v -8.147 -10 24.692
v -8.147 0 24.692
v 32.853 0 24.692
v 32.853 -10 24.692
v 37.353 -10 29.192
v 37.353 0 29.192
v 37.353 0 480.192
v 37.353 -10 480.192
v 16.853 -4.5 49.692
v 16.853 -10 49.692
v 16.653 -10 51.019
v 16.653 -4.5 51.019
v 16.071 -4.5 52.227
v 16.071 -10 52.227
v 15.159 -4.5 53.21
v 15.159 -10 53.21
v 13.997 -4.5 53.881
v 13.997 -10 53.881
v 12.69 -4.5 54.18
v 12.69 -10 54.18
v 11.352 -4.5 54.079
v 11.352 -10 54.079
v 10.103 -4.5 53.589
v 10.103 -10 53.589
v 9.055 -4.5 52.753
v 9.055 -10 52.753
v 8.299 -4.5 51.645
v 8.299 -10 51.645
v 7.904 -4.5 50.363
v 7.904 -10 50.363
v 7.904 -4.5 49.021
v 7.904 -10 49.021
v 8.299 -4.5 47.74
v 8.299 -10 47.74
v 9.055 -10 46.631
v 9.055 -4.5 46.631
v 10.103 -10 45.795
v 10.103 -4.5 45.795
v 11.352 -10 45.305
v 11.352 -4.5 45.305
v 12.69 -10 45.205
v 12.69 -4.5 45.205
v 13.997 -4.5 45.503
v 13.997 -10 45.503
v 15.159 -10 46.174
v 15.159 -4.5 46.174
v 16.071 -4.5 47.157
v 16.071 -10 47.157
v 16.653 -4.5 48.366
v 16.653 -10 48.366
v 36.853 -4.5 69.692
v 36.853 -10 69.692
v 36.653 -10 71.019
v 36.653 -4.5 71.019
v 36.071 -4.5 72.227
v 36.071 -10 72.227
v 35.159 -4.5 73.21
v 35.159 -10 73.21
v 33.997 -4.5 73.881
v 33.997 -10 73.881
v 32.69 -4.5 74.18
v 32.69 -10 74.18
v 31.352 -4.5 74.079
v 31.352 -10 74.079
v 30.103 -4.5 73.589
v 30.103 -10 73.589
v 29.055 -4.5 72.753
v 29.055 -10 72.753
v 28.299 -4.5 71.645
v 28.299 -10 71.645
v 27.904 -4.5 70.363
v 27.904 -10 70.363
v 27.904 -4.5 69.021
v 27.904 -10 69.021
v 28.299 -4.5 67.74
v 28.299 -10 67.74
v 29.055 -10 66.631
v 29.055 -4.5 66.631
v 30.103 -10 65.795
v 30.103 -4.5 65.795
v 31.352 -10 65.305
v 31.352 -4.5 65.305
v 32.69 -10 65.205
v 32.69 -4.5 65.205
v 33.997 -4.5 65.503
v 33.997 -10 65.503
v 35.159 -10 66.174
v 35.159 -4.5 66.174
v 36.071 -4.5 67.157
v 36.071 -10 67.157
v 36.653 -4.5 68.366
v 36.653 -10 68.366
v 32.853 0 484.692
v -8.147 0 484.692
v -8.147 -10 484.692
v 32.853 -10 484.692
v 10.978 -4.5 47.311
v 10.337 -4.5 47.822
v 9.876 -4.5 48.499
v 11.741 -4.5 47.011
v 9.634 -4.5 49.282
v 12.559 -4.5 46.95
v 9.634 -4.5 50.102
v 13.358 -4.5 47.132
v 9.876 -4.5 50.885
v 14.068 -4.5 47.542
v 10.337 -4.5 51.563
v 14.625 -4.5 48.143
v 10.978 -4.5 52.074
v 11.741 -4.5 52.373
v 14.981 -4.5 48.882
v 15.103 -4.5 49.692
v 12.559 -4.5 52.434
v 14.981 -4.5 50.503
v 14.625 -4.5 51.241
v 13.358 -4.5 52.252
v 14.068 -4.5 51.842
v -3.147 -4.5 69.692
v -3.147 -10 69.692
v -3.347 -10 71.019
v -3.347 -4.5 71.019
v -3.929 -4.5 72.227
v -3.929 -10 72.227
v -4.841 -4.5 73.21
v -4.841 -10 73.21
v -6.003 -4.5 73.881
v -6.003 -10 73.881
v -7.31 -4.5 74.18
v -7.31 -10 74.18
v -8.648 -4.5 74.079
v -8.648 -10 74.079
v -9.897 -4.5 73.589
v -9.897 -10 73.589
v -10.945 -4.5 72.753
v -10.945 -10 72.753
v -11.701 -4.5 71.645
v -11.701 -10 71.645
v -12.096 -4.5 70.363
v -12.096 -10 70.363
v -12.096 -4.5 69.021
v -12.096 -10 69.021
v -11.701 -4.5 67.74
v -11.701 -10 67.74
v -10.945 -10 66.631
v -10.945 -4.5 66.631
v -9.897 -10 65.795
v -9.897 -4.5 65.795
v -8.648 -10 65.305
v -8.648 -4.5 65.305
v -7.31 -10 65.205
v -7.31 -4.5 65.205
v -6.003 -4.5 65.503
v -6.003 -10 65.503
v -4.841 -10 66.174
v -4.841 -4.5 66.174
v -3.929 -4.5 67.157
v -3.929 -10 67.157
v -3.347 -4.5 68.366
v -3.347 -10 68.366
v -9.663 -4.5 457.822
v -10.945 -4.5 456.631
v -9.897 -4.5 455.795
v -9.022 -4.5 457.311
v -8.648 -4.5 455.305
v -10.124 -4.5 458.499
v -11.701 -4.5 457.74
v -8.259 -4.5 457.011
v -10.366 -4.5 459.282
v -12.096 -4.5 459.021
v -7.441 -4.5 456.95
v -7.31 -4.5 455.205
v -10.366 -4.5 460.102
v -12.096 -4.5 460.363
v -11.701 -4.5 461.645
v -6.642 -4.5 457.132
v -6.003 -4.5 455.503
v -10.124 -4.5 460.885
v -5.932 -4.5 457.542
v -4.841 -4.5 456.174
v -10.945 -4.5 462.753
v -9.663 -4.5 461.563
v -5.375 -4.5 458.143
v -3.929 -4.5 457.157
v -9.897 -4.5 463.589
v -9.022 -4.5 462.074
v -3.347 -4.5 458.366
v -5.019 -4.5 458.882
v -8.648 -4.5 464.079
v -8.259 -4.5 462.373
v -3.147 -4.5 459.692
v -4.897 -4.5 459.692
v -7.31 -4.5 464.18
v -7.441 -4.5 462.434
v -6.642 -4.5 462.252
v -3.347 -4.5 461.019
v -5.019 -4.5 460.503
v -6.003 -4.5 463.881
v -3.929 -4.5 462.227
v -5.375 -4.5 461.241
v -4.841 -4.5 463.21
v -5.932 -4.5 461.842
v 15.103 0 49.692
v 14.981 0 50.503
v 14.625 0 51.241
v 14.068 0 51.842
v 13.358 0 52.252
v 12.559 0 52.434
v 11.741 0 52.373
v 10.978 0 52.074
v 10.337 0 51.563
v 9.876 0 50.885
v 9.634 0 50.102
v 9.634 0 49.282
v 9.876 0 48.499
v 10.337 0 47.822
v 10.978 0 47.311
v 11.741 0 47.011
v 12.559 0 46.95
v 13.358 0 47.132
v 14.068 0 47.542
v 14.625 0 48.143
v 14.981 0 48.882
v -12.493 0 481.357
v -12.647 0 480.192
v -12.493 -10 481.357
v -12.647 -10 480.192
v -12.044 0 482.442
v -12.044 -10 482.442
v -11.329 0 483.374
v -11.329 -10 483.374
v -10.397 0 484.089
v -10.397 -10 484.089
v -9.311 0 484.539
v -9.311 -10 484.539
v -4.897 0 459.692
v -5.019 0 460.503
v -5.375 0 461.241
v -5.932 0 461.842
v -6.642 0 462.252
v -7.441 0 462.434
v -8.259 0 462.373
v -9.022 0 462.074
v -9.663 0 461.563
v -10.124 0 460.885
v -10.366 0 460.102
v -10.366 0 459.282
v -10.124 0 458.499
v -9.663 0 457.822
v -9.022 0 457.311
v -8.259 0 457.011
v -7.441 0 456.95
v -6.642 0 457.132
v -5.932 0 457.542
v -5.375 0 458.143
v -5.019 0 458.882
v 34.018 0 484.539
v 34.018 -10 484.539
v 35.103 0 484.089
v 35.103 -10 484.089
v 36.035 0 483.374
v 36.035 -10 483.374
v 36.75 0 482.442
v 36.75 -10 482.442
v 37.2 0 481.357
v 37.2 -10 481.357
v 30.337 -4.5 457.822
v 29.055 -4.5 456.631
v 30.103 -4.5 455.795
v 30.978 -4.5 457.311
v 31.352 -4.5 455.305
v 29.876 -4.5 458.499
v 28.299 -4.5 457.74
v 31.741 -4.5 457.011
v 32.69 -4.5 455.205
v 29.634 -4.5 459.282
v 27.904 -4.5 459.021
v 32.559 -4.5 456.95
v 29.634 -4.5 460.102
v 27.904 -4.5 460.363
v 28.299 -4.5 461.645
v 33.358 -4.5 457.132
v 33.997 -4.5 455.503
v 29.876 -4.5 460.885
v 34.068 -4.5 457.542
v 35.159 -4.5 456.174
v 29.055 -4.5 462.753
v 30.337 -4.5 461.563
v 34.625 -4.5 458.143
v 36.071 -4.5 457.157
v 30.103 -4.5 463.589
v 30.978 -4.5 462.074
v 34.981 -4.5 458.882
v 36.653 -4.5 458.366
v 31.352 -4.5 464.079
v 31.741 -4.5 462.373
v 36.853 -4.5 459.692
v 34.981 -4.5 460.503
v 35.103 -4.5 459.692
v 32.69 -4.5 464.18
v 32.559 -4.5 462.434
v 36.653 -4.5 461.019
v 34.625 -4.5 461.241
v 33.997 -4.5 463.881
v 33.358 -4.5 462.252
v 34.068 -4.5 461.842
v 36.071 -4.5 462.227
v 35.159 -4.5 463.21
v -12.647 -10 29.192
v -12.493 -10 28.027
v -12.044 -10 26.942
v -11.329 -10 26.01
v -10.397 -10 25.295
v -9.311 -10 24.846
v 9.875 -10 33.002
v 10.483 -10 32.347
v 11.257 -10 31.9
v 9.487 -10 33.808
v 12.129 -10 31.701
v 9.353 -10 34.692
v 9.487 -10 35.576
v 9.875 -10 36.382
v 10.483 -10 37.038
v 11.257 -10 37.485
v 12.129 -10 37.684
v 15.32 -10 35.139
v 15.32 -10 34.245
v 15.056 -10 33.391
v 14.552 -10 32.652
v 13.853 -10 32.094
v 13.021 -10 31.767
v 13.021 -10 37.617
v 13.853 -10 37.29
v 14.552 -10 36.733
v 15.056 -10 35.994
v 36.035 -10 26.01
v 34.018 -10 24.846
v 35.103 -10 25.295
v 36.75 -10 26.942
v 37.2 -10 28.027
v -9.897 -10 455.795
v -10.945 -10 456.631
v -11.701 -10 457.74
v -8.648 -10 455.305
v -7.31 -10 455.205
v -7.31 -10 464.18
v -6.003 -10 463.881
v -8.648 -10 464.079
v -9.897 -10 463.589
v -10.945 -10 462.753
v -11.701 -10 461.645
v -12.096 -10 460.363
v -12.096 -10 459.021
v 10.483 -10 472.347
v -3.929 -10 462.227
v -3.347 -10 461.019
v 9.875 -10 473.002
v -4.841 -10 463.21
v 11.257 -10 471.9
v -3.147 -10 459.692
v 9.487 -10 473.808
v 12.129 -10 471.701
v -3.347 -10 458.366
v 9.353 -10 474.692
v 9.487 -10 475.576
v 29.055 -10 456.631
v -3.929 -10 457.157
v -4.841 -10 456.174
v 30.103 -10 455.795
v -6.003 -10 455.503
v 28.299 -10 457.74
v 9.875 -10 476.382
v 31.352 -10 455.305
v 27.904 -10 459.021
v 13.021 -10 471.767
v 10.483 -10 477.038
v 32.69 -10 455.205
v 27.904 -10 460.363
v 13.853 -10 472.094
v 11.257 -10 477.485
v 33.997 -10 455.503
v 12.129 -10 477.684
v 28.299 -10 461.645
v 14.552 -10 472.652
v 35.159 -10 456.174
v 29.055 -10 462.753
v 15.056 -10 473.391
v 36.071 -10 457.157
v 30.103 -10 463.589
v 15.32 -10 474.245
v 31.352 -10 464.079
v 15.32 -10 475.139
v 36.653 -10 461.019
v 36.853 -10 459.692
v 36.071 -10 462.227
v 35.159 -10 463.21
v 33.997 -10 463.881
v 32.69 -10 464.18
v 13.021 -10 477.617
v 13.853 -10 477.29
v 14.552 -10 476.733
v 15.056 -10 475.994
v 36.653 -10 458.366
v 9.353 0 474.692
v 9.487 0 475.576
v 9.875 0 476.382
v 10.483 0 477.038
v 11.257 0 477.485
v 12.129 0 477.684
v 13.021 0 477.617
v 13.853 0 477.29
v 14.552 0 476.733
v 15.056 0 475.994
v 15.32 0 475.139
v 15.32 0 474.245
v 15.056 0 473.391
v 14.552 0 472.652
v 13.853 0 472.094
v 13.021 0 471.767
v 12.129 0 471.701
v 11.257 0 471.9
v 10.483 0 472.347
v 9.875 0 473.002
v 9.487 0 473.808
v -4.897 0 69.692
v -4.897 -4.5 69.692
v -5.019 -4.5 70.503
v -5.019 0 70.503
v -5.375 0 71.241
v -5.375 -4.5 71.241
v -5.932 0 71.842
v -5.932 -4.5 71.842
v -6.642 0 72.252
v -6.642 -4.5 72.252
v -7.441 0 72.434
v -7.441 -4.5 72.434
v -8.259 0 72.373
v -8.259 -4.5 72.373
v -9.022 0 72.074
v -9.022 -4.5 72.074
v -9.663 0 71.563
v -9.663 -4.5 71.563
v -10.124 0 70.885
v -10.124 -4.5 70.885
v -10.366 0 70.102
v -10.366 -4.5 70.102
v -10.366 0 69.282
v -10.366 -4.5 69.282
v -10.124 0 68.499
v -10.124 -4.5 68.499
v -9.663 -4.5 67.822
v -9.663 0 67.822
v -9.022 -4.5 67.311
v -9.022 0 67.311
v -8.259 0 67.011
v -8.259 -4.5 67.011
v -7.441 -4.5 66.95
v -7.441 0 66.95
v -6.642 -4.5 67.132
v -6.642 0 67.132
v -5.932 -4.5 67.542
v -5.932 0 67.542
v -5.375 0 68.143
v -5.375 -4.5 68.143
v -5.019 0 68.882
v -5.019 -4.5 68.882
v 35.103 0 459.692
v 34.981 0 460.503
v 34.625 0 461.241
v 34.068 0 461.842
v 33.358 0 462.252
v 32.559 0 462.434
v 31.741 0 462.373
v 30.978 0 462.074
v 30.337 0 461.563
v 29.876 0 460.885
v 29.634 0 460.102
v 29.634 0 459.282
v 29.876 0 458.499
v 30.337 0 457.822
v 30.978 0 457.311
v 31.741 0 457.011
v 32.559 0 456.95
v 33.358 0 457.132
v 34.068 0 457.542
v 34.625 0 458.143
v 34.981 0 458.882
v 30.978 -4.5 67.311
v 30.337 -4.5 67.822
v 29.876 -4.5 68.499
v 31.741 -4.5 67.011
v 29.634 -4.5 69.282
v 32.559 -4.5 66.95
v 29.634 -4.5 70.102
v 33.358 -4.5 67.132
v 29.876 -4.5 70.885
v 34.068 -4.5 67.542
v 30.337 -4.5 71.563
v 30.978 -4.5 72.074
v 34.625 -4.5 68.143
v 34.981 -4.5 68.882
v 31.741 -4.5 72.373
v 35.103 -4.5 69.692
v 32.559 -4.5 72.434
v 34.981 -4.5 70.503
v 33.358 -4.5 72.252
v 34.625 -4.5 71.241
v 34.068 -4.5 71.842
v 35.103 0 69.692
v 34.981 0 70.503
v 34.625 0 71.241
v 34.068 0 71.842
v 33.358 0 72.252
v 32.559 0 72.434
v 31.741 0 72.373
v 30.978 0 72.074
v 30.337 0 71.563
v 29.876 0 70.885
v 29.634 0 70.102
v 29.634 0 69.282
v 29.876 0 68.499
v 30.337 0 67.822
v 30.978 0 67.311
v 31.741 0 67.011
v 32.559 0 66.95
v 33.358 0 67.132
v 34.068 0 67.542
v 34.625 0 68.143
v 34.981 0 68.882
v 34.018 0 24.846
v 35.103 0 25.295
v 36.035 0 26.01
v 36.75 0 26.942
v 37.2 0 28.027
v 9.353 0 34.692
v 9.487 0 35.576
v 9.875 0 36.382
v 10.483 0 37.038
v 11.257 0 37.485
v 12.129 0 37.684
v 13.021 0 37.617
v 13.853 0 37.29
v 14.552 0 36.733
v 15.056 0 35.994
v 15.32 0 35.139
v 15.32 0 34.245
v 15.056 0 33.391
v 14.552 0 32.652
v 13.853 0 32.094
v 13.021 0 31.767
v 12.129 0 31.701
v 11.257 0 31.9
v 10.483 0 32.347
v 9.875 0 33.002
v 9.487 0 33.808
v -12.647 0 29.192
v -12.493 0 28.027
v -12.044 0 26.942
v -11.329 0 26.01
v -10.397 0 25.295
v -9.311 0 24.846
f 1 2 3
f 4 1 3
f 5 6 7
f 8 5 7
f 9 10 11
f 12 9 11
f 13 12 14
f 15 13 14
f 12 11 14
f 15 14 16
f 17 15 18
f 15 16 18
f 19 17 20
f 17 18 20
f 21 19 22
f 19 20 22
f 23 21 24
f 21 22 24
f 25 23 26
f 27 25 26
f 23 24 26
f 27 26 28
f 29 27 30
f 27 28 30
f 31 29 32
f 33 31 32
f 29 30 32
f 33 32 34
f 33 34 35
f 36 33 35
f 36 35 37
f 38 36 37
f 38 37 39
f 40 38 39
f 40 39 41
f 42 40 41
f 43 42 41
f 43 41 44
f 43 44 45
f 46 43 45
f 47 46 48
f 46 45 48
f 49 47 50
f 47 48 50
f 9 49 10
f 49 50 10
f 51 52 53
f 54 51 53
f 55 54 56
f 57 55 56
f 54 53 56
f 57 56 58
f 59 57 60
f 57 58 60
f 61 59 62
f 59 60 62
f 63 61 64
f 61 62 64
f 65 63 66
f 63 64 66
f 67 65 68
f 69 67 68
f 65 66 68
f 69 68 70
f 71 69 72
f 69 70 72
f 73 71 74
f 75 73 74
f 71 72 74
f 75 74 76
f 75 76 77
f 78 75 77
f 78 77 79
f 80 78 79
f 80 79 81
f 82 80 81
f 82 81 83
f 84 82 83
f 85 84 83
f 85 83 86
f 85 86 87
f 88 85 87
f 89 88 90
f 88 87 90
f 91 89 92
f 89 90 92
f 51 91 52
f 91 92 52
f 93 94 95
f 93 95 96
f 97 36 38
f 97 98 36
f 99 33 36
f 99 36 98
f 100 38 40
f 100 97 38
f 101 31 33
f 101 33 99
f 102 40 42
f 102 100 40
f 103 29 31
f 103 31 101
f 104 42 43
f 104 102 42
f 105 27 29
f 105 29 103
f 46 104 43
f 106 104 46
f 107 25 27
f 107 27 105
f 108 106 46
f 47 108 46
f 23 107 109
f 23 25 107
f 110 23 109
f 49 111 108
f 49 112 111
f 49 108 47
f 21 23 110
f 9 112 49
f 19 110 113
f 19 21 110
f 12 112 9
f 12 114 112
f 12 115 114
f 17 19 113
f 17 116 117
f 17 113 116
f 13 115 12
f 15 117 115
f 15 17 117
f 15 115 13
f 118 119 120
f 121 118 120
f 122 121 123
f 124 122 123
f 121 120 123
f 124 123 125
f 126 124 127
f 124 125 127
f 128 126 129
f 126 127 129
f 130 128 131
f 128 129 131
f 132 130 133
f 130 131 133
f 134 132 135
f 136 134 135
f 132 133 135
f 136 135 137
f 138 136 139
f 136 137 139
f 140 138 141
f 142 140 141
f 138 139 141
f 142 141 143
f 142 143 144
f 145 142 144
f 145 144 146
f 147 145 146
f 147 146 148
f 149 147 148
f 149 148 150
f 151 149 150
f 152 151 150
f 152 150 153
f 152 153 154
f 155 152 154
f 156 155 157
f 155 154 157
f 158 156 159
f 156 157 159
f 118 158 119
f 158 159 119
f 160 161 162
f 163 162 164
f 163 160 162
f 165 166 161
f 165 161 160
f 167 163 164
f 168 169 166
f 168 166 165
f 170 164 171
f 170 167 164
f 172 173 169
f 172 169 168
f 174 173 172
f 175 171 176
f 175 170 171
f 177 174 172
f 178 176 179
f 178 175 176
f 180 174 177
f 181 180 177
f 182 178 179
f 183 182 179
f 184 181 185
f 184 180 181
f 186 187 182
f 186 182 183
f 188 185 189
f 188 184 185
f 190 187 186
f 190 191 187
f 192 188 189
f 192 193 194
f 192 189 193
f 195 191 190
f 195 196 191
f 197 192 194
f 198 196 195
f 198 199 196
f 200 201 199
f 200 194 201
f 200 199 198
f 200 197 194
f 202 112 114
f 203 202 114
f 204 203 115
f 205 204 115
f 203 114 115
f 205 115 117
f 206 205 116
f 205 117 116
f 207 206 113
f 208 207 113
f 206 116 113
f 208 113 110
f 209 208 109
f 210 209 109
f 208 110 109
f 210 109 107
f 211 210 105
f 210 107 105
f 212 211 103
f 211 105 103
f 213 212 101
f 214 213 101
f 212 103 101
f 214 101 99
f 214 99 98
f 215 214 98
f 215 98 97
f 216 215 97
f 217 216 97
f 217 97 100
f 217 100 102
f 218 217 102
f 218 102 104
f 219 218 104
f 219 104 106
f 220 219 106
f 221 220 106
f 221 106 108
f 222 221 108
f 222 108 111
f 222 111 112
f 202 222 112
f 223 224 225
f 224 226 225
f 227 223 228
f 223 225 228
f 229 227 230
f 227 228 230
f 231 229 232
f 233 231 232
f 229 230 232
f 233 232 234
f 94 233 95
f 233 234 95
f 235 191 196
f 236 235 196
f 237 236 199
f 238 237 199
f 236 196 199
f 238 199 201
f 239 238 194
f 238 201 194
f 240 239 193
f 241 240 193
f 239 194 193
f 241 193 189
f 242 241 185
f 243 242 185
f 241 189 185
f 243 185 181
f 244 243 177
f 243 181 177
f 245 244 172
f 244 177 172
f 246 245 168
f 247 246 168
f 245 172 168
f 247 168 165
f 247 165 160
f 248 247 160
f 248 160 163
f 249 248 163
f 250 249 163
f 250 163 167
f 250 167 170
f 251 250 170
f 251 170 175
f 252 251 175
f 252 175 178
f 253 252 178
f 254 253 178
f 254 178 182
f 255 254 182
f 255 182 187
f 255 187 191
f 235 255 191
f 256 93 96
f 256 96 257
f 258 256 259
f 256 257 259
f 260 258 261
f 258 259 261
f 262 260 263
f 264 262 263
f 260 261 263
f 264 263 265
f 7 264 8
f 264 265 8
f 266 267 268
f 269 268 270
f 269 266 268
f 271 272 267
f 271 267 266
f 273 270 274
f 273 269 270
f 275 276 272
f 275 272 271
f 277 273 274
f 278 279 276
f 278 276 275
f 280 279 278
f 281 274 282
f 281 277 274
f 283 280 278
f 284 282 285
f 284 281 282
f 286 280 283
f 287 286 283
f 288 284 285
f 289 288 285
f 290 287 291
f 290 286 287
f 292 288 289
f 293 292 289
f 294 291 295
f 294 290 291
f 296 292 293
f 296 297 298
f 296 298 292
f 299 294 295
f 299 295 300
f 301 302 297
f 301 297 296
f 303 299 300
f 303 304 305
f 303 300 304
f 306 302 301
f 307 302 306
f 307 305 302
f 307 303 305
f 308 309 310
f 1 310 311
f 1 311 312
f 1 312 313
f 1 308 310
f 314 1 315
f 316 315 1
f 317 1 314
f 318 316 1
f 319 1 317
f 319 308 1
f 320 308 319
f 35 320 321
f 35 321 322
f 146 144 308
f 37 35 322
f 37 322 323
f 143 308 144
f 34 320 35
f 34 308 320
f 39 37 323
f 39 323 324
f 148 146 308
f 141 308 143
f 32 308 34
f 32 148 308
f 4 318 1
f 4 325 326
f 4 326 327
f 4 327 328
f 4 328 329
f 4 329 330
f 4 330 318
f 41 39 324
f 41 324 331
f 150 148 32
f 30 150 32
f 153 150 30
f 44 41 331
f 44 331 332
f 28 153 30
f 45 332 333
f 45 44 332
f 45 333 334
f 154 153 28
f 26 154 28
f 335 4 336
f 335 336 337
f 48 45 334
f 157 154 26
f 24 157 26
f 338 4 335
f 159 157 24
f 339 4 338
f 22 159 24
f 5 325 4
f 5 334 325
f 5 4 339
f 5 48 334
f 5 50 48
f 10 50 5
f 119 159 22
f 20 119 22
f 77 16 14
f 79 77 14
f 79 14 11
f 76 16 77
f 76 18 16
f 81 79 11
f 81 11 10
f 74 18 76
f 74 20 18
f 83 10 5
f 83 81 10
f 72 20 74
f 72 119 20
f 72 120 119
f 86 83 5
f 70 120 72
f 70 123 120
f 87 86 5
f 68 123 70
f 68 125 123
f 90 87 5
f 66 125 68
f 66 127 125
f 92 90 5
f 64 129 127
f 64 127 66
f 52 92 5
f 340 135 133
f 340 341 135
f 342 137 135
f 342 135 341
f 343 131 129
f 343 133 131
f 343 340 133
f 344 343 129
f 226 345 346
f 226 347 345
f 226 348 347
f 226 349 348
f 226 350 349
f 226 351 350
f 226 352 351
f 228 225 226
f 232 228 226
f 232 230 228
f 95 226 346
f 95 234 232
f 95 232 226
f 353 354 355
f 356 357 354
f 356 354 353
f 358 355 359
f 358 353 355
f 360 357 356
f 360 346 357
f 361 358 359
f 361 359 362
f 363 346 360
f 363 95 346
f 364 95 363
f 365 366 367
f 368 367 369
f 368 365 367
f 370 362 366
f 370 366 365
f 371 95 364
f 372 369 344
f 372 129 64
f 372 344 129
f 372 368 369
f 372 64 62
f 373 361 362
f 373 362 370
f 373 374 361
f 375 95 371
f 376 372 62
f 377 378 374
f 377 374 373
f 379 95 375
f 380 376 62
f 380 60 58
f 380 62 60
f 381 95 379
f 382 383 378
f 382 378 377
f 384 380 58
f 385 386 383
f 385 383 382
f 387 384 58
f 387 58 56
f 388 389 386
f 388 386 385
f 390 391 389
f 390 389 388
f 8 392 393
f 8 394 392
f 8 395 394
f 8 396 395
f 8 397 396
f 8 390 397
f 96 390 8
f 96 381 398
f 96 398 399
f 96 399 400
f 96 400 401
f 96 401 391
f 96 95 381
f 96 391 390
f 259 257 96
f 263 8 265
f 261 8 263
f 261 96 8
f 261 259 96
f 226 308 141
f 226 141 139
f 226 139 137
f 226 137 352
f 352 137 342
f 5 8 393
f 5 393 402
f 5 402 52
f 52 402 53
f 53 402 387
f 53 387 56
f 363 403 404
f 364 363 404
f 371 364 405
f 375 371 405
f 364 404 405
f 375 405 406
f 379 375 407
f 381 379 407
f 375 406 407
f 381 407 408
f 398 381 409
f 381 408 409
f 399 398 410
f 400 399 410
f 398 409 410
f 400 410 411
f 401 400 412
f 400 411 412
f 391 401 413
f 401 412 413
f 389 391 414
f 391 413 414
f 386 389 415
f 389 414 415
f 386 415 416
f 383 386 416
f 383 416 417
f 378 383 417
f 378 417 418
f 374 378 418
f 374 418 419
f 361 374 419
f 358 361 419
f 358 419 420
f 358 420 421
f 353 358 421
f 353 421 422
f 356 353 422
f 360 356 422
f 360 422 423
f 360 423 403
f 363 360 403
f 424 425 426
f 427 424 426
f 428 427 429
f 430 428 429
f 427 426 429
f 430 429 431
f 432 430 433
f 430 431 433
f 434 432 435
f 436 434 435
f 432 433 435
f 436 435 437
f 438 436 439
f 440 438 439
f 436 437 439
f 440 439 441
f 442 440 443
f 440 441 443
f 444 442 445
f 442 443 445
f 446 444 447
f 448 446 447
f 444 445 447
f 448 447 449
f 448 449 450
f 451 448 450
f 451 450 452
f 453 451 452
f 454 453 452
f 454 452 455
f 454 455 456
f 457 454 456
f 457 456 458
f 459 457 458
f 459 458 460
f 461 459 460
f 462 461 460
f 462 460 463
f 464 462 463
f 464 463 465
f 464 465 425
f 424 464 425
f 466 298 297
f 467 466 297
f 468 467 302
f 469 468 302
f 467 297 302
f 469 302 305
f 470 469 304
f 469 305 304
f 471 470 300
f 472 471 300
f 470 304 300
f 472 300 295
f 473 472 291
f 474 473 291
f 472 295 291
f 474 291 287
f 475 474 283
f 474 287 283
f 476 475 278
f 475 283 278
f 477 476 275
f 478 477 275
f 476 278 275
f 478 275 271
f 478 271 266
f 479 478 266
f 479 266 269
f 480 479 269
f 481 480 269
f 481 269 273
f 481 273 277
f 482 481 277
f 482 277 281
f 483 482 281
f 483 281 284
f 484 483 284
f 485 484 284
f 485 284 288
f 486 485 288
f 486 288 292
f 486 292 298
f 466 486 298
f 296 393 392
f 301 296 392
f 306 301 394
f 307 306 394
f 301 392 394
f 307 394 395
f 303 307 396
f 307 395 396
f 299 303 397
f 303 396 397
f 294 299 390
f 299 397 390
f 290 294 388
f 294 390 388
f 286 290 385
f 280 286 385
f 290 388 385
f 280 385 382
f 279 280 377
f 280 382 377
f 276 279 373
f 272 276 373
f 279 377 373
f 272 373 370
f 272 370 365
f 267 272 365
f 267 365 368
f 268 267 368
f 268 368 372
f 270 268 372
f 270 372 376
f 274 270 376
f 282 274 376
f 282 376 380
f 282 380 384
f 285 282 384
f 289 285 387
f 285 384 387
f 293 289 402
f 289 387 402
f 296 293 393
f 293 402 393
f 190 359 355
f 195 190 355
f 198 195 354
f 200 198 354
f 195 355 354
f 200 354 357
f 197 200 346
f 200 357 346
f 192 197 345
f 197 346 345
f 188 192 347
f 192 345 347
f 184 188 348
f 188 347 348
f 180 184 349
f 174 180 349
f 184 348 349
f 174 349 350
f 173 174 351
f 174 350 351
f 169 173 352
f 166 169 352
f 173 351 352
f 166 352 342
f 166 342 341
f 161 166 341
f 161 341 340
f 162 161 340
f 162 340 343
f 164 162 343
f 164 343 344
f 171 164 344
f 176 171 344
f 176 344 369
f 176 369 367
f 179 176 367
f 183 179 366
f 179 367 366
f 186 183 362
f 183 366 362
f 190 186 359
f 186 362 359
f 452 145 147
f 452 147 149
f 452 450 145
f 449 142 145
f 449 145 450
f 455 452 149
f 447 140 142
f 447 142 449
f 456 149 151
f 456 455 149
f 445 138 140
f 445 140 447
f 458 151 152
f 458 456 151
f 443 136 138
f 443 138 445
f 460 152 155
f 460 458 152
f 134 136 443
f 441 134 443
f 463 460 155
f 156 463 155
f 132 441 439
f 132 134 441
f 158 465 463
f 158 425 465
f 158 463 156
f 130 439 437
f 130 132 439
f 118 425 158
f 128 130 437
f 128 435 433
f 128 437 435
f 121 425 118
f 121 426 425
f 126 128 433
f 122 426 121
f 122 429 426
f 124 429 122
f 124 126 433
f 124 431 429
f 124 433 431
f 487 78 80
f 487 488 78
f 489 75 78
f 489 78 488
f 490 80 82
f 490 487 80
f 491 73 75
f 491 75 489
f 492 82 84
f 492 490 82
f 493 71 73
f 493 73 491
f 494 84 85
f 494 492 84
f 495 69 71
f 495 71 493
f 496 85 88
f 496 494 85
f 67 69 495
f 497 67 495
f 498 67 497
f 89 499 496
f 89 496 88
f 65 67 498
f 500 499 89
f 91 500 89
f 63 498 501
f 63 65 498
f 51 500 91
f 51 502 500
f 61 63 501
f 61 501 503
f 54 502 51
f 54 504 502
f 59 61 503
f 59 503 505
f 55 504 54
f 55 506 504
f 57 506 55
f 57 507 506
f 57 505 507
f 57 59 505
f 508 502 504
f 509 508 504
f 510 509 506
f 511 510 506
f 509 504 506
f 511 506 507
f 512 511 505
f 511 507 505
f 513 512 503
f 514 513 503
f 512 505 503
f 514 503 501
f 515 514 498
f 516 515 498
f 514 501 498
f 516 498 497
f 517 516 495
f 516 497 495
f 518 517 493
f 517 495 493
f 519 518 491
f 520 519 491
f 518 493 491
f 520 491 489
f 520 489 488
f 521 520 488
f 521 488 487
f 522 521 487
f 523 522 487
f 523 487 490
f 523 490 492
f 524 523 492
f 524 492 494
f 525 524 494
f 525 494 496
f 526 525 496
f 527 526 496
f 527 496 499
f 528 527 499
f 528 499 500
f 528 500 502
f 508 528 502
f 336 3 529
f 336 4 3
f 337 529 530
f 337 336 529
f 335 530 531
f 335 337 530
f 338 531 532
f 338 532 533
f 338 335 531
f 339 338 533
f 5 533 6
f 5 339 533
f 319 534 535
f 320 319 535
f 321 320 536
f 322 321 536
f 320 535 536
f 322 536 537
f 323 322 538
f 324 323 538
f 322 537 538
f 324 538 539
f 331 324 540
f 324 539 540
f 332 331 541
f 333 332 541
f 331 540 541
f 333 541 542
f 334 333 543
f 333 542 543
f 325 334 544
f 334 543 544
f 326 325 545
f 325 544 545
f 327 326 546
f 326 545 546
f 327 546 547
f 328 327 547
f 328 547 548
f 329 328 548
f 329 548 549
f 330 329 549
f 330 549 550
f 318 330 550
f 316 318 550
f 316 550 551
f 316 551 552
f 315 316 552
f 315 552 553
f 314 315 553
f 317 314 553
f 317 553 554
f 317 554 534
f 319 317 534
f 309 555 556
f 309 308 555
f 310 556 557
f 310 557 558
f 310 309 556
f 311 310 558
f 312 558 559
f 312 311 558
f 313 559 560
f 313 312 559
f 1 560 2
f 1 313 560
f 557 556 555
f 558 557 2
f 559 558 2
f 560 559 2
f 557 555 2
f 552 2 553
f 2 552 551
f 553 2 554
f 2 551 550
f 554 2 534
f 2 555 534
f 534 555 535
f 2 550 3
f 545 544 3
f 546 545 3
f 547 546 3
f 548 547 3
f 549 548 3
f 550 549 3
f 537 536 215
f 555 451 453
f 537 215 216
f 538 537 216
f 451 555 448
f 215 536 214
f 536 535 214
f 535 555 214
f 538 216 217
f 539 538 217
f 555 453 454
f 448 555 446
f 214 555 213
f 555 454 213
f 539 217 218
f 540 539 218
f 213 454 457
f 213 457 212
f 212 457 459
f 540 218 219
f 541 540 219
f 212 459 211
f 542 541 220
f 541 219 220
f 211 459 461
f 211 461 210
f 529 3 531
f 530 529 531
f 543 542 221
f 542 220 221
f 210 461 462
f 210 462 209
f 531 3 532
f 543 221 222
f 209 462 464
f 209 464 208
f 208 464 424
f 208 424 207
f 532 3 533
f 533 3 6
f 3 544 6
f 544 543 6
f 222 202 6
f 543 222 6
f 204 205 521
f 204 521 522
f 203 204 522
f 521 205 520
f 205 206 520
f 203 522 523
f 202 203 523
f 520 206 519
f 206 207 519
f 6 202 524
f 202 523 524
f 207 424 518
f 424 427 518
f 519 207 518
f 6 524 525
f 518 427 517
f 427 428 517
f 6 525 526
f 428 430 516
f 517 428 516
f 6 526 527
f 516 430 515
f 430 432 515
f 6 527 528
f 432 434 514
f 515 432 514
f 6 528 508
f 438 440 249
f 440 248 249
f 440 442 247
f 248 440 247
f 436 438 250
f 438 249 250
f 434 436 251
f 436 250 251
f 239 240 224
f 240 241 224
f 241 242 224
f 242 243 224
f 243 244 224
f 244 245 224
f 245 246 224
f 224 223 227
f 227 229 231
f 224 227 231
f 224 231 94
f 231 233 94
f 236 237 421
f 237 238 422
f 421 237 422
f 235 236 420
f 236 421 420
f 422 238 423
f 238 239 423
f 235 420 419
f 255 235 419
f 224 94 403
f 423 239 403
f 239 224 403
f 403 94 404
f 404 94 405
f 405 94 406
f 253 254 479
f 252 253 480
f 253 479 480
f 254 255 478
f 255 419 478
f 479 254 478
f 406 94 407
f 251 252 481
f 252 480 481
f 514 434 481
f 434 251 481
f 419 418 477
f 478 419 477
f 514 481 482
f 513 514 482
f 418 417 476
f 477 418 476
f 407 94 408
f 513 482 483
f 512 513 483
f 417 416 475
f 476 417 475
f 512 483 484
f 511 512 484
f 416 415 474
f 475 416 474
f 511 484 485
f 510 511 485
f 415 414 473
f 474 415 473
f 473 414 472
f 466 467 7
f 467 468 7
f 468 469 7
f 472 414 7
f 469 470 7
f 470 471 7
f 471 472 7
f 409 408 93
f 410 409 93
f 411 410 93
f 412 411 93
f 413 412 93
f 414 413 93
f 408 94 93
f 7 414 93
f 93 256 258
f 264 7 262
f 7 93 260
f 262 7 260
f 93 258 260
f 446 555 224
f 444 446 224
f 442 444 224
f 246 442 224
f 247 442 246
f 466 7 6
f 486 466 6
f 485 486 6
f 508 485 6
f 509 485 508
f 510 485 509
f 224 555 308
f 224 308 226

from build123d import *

# Parameters (mm, degrees)
SKETCH1_W           = 50
SKETCH1_H           = 460
BOSS_EXTRUDE1_DEPTH = 10
CUT_EXTRUDE1_REACH  = 12
SKETCH2_R           = 2.75
SKETCH3_R           = 4.5
CUT_EXTRUDE2_DEPTH  = 5.5
CUT_EXTRUDE3_REACH  = 12
SKETCH4_R           = 2.75
SKETCH5_R           = 4.5
CUT_EXTRUDE4_DEPTH  = 5.5
FILLET2_R           = 4.5
CUT_EXTRUDE5_REACH  = 12
SKETCH6_R           = 3


with BuildPart() as part:
    # Sketch1 → Boss-Extrude1 (new body)
    with BuildSketch(Plane.XZ):
        with Locations((12.35332591, 254.692172039)):
            Rectangle(SKETCH1_W, SKETCH1_H)
    extrude(amount=BOSS_EXTRUDE1_DEPTH)

    # Sketch2 → Cut-Extrude1 (cut, up to next)
    with BuildSketch(Plane.XZ.offset(10), mode=Mode.PRIVATE) as cut_extrude1_sk1:
        with Locations((32.35332591, 69.692172039)):
            Circle(SKETCH2_R)
    cut_extrude1_tool1 = extrude(cut_extrude1_sk1.sketch, amount=-CUT_EXTRUDE1_REACH, mode=Mode.PRIVATE) & part.part
    add(cut_extrude1_tool1.solids().sort_by_distance((32.353326, -10, 69.692172))[0], mode=Mode.SUBTRACT)
    # Sketch2 → Cut-Extrude1 (cut, up to next)
    with BuildSketch(Plane.XZ.offset(10), mode=Mode.PRIVATE) as cut_extrude1_sk2:
        with Locations((-7.64667409, 69.692172039)):
            Circle(SKETCH2_R)
    cut_extrude1_tool2 = extrude(cut_extrude1_sk2.sketch, amount=-CUT_EXTRUDE1_REACH, mode=Mode.PRIVATE) & part.part
    add(cut_extrude1_tool2.solids().sort_by_distance((-7.646674, -10, 69.692172))[0], mode=Mode.SUBTRACT)
    # Sketch2 → Cut-Extrude1 (cut, up to next)
    with BuildSketch(Plane.XZ.offset(10), mode=Mode.PRIVATE) as cut_extrude1_sk3:
        with Locations((12.35332591, 49.692172039)):
            Circle(SKETCH2_R)
    cut_extrude1_tool3 = extrude(cut_extrude1_sk3.sketch, amount=-CUT_EXTRUDE1_REACH, mode=Mode.PRIVATE) & part.part
    add(cut_extrude1_tool3.solids().sort_by_distance((12.353326, -10, 49.692172))[0], mode=Mode.SUBTRACT)

    # Sketch3 → Cut-Extrude2 (cut)
    with BuildSketch(Plane.XZ.offset(10)):
        with Locations((-7.64667409, 69.692172039)):
            Circle(SKETCH3_R)
        with Locations((32.35332591, 69.692172039)):
            Circle(SKETCH3_R)
        with Locations((12.35332591, 49.692172039)):
            Circle(SKETCH3_R)
    extrude(amount=-CUT_EXTRUDE2_DEPTH, mode=Mode.SUBTRACT)

    # Sketch4 → Cut-Extrude3 (cut, up to next)
    with BuildSketch(Plane.XZ.offset(10), mode=Mode.PRIVATE) as cut_extrude3_sk1:
        with Locations((-7.64667409, 459.692172039)):
            Circle(SKETCH4_R)
    cut_extrude3_tool1 = extrude(cut_extrude3_sk1.sketch, amount=-CUT_EXTRUDE3_REACH, mode=Mode.PRIVATE) & part.part
    add(cut_extrude3_tool1.solids().sort_by_distance((-7.646674, -10, 459.692172))[0], mode=Mode.SUBTRACT)
    # Sketch4 → Cut-Extrude3 (cut, up to next)
    with BuildSketch(Plane.XZ.offset(10), mode=Mode.PRIVATE) as cut_extrude3_sk2:
        with Locations((32.35332591, 459.692172039)):
            Circle(SKETCH4_R)
    cut_extrude3_tool2 = extrude(cut_extrude3_sk2.sketch, amount=-CUT_EXTRUDE3_REACH, mode=Mode.PRIVATE) & part.part
    add(cut_extrude3_tool2.solids().sort_by_distance((32.353326, -10, 459.692172))[0], mode=Mode.SUBTRACT)

    # Sketch5 → Cut-Extrude4 (cut)
    with BuildSketch(Plane.XZ.offset(10)):
        with Locations((-7.64667409, 459.692172039)):
            Circle(SKETCH5_R)
        with Locations((32.35332591, 459.692172039)):
            Circle(SKETCH5_R)
    extrude(amount=-CUT_EXTRUDE4_DEPTH, mode=Mode.SUBTRACT)

    # Fillet2
    fillet2_edges = [part.edges().sort_by_distance(p)[0] for p in [
        (37.35332591, -5, 24.692172039),
        (-12.64667409, -5, 24.692172039),
        (-12.64667409, -5, 484.692172039),
        (37.35332591, -5, 484.692172039),
    ]]
    fillet(fillet2_edges, radius=FILLET2_R)

    # Sketch6 → Cut-Extrude5 (cut, up to next)
    with BuildSketch(Plane(origin=(0, 0, 0), x_dir=(-1, 0, 0), z_dir=(0, 1, 0)), mode=Mode.PRIVATE) as cut_extrude5_sk1:
        with Locations((-12.35332591, 474.692172039)):
            Circle(SKETCH6_R)
    cut_extrude5_tool1 = extrude(cut_extrude5_sk1.sketch, amount=-CUT_EXTRUDE5_REACH, mode=Mode.PRIVATE) & part.part
    add(cut_extrude5_tool1.solids().sort_by_distance((12.353326, 0, 474.692172))[0], mode=Mode.SUBTRACT)
    # Sketch6 → Cut-Extrude5 (cut, up to next)
    with BuildSketch(Plane(origin=(0, 0, 0), x_dir=(-1, 0, 0), z_dir=(0, 1, 0)), mode=Mode.PRIVATE) as cut_extrude5_sk2:
        with Locations((-12.35332591, 34.692172039)):
            Circle(SKETCH6_R)
    cut_extrude5_tool2 = extrude(cut_extrude5_sk2.sketch, amount=-CUT_EXTRUDE5_REACH, mode=Mode.PRIVATE) & part.part
    add(cut_extrude5_tool2.solids().sort_by_distance((12.353326, 0, 34.692172))[0], mode=Mode.SUBTRACT)


solid = part.part
